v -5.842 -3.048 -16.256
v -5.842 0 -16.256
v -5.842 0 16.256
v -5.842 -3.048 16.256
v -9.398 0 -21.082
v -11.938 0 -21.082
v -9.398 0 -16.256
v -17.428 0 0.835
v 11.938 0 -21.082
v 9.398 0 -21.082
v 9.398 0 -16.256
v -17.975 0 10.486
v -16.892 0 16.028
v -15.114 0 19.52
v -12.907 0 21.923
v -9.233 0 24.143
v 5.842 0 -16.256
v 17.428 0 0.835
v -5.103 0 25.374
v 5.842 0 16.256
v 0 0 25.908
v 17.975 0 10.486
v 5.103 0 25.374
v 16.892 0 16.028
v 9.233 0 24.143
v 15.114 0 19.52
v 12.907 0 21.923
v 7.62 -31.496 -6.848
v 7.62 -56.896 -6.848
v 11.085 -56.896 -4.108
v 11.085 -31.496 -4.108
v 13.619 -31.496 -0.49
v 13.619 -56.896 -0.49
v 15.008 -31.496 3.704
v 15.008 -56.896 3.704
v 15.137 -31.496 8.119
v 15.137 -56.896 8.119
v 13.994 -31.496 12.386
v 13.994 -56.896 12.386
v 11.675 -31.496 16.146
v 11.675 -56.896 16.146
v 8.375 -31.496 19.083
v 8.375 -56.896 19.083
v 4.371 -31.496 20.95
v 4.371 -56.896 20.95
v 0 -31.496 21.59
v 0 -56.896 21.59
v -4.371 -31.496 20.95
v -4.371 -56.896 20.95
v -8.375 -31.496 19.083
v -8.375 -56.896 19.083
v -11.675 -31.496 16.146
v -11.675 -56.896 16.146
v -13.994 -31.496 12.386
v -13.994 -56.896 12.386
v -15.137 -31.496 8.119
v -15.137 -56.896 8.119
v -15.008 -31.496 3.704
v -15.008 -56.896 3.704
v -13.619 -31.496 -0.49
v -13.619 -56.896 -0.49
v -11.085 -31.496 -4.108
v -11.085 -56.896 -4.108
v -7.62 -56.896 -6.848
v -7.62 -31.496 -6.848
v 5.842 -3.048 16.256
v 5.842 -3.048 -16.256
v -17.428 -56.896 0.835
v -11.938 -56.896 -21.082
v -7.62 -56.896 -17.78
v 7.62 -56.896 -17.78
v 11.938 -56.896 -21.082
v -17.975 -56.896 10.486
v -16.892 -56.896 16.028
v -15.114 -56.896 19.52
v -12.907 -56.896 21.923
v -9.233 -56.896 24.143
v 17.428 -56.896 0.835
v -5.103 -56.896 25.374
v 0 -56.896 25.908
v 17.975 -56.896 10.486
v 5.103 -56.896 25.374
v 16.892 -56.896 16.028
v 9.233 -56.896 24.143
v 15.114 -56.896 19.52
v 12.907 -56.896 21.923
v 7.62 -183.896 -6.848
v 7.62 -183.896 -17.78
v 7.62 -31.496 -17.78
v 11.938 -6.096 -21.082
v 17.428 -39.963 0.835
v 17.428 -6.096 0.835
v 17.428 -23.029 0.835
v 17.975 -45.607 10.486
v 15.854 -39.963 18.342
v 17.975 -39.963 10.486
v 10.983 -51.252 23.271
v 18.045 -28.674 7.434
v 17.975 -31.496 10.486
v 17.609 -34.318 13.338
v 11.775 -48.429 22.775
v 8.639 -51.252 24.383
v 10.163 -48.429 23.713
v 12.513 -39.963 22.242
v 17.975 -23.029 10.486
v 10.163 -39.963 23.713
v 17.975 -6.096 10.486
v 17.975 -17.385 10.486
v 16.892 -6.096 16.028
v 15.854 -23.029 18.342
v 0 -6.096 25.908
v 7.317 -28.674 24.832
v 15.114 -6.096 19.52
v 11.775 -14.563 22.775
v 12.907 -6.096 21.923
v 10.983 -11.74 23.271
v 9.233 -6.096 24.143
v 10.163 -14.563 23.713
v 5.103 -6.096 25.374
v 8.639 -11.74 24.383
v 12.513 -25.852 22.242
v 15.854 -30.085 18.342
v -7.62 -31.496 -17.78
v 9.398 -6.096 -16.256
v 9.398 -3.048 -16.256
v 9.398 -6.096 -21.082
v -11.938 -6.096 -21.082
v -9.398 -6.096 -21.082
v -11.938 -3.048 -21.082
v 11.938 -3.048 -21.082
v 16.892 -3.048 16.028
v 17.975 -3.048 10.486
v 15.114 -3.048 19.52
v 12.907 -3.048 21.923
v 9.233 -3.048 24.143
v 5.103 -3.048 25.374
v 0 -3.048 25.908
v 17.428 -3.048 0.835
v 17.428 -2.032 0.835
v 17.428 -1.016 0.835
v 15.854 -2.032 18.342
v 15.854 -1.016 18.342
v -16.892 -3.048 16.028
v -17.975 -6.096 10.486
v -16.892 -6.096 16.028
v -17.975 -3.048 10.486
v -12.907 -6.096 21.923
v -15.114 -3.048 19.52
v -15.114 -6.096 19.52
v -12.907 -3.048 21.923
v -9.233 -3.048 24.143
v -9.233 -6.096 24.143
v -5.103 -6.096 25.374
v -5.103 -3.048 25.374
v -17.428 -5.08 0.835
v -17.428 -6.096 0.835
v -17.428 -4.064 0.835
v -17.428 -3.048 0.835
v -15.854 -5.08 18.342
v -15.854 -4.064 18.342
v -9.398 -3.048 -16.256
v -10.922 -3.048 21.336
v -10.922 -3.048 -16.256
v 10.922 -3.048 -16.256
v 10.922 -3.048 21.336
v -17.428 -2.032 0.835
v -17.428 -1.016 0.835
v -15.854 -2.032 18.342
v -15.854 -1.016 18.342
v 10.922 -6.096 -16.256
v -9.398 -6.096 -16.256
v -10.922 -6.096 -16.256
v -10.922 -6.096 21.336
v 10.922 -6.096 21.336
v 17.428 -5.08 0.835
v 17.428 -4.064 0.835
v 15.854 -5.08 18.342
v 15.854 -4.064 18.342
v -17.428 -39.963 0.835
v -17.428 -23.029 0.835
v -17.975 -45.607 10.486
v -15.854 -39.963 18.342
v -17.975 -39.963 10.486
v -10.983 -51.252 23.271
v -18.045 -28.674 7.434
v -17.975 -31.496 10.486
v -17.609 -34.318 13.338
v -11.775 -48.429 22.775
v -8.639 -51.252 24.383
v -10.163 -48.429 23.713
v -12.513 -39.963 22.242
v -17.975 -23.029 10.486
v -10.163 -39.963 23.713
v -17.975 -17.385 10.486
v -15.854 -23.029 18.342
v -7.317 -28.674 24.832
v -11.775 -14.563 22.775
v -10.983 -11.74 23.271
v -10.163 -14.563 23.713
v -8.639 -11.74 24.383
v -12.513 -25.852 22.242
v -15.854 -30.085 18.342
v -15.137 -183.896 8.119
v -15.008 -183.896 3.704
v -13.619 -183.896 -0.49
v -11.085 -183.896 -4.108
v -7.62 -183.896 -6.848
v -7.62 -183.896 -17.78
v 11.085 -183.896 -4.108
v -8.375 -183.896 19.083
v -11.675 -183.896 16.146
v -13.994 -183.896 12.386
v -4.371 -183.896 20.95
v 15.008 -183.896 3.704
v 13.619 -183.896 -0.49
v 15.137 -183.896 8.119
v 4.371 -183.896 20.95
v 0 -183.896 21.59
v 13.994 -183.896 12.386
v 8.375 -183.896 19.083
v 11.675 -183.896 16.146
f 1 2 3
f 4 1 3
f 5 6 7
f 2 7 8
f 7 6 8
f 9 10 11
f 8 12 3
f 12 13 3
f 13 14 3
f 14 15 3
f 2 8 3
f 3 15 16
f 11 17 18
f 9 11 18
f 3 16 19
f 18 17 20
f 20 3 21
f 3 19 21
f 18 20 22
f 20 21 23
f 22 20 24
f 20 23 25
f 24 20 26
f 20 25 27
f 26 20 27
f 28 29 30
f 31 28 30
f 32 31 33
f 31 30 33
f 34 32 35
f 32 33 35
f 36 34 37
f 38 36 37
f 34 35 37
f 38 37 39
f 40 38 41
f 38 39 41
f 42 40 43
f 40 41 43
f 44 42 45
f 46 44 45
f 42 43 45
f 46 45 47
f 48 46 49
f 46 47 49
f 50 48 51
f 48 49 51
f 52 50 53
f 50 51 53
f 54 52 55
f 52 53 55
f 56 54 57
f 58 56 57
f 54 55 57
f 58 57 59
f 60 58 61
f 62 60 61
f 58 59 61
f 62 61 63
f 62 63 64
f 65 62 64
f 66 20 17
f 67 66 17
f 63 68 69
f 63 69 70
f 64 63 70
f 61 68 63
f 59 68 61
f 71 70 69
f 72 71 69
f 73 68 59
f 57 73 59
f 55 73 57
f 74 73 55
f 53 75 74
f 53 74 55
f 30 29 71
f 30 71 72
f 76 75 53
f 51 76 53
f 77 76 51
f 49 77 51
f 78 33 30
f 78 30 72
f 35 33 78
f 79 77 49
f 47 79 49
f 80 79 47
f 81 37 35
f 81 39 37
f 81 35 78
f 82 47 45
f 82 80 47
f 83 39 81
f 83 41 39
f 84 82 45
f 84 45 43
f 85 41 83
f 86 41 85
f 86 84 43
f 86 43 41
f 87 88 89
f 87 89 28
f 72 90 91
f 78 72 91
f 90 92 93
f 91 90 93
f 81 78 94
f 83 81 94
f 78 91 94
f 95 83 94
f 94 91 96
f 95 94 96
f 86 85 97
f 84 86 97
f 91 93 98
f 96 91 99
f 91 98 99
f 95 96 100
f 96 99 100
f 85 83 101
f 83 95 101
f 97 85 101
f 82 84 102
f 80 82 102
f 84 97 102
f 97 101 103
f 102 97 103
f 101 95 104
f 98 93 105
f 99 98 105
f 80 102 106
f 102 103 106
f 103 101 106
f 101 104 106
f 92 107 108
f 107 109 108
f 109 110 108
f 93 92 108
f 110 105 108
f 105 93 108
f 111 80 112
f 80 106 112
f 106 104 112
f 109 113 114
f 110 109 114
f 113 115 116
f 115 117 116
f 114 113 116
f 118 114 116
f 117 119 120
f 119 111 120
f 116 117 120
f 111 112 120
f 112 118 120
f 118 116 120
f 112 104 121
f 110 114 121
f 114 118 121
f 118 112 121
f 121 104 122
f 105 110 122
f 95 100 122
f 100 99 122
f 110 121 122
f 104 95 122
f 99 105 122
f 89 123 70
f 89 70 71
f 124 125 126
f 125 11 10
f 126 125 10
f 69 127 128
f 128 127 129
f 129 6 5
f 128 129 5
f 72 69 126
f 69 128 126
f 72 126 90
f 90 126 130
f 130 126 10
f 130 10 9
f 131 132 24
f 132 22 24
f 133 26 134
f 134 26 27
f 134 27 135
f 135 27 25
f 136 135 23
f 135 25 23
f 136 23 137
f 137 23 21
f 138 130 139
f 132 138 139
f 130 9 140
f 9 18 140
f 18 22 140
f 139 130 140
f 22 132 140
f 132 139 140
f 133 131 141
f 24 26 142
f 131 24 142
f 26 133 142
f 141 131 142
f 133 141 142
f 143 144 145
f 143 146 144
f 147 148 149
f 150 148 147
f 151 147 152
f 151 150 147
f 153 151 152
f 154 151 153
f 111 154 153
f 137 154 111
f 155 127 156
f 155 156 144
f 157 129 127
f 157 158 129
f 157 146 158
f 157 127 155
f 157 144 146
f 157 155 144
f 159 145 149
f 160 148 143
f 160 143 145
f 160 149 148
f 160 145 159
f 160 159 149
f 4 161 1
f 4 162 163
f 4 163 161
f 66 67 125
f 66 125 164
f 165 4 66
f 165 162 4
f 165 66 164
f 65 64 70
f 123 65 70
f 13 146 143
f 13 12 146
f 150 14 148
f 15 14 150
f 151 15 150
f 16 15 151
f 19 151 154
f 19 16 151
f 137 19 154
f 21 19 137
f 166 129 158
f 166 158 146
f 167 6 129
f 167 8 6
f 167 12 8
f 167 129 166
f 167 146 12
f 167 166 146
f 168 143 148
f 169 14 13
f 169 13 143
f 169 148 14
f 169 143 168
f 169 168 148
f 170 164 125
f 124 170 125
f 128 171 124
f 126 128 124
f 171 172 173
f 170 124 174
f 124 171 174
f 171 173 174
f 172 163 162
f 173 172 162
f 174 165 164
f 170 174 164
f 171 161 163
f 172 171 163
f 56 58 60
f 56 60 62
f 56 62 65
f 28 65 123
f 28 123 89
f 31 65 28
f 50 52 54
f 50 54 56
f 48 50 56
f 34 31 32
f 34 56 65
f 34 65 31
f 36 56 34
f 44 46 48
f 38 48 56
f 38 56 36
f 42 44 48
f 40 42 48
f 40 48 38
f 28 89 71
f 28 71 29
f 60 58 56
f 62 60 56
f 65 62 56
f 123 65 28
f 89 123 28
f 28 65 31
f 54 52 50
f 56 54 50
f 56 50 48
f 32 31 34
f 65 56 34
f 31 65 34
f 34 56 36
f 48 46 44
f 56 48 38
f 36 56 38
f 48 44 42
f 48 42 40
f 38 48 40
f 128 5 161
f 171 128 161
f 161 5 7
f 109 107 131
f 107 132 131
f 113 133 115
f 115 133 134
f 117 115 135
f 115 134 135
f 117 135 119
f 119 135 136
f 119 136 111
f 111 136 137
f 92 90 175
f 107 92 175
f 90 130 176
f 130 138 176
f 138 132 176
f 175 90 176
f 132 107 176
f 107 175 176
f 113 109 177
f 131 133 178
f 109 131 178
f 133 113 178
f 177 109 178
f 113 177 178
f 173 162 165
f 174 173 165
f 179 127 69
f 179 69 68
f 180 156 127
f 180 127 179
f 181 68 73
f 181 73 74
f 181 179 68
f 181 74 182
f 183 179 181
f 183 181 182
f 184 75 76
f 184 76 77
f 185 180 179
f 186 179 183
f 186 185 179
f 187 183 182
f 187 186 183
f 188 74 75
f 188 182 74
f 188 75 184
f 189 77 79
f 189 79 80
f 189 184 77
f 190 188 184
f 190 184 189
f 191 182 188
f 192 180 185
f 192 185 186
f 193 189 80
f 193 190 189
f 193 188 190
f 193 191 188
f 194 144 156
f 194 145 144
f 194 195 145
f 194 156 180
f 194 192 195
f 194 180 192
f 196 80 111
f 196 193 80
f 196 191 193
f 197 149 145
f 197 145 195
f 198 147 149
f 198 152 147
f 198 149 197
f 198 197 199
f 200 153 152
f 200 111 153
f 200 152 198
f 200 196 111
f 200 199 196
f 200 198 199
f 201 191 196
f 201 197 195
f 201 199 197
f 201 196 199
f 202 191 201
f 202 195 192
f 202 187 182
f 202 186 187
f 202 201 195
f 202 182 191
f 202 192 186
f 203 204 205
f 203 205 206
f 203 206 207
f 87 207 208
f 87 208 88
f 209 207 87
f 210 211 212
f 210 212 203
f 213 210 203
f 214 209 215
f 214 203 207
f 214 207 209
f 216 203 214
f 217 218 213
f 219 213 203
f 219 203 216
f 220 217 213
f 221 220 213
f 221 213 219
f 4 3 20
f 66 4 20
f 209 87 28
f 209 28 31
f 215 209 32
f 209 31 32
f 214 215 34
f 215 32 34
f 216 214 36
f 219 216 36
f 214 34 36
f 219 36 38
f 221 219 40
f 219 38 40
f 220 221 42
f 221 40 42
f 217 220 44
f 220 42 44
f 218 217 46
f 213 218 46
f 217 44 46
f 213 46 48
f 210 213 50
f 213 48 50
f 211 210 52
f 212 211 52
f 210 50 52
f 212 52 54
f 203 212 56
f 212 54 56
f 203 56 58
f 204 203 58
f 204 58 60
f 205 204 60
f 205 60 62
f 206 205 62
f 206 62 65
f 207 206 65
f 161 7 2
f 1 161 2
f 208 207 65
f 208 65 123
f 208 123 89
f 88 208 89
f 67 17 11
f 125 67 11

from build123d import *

# Parameters (mm, degrees)
F1_DEPTH = 3.048
F3_DEPTH = 3.048
F5_DEPTH = 50.8
F7_DEPTH = 25.4
F8_DEPTH = 152.4


with BuildPart() as f1:
    # F0 (on Front) → F1 (new body)
    with BuildSketch(Plane.XZ):
        with BuildLine():
            Line((-5.842, -16.256), (-5.842, 16.256))
            Line((-5.842, 16.256), (5.842, 16.256))
            Line((5.842, 16.256), (5.842, -16.256))
            Line((5.842, -16.256), (9.398, -16.256))
            Line((9.398, -16.256), (9.398, -21.082))
            Line((9.398, -21.082), (11.938, -21.082))
            add(Edge.make_bspline(
                [(11.938, -21.082), (18.554886803, 1.1973426444), (25.400293991, 25.156263262), (0, 25.908)],
                knots=[0, 0, 0, 0, 48.482738619, 48.482738619, 48.482738619, 48.482738619], degree=3))
            add(Edge.make_bspline(
                [(-11.938, -21.082), (-18.554886803, 1.1973426444), (-25.400293991, 25.156263262), (0, 25.908)],
                knots=[0, 0, 0, 0, 48.482738619, 48.482738619, 48.482738619, 48.482738619], degree=3))
            Line((-11.938, -21.082), (-9.398, -21.082))
            Line((-9.398, -21.082), (-9.398, -16.256))
            Line((-9.398, -16.256), (-5.842, -16.256))
        make_face()
    extrude(amount=F1_DEPTH)

    # F2 (on face) → F3 (join)
    with BuildSketch(Plane.XZ.offset(3.048)):
        with BuildLine():
            Line((-10.922, -16.256), (-10.922, 21.336))
            Line((-10.922, 21.336), (10.922, 21.336))
            Line((10.922, 21.336), (10.922, -16.256))
            Line((10.922, -16.256), (9.398, -16.256))
            Line((9.398, -16.256), (9.398, -21.082))
            Line((9.398, -21.082), (11.938, -21.082))
            add(Edge.make_bspline(
                [(11.938, -21.082), (18.554886803, 1.1973426444), (25.400293991, 25.156263262), (0, 25.908)],
                knots=[0, 0, 0, 0, 48.482738619, 48.482738619, 48.482738619, 48.482738619], degree=3))
            add(Edge.make_bspline(
                [(-11.938, -21.082), (-18.554886803, 1.1973426444), (-25.400293991, 25.156263262), (0, 25.908)],
                knots=[0, 0, 0, 0, 48.482738619, 48.482738619, 48.482738619, 48.482738619], degree=3))
            Line((-11.938, -21.082), (-9.398, -21.082))
            Line((-9.398, -21.082), (-9.398, -16.256))
            Line((-9.398, -16.256), (-10.922, -16.256))
        make_face()
    extrude(amount=F3_DEPTH)

    # F4 (on face) → F5 (join)
    with BuildSketch(Plane.XZ.offset(6.096)):
        with BuildLine():
            Line((-11.938, -21.082), (-9.398, -21.082))
            Line((-9.398, -21.082), (-9.398, -16.256))
            Line((-9.398, -16.256), (-10.922, -16.256))
            Line((-10.922, -16.256), (-10.922, 21.336))
            Line((-10.922, 21.336), (10.922, 21.336))
            Line((10.922, 21.336), (10.922, -16.256))
            Line((10.922, -16.256), (9.398, -16.256))
            Line((9.398, -16.256), (9.398, -21.082))
            Line((9.398, -21.082), (11.938, -21.082))
            add(Edge.make_bspline(
                [(11.938, -21.082), (18.554886803, 1.1973426444), (25.400293991, 25.156263262), (0, 25.908)],
                knots=[0, 0, 0, 0, 48.482738619, 48.482738619, 48.482738619, 48.482738619], degree=3))
            add(Edge.make_bspline(
                [(-11.938, -21.082), (-18.554886803, 1.1973426444), (-25.400293991, 25.156263262), (0, 25.908)],
                knots=[0, 0, 0, 0, 48.482738619, 48.482738619, 48.482738619, 48.482738619], degree=3))
        make_face()
        Polygon((-9.398, -16.256), (-9.398, -21.082), (9.398, -21.082), (9.398, -16.256), (10.922, -16.256), (10.922, 21.336), (-10.922, 21.336), (-10.922, -16.256), align=None)
    extrude(amount=F5_DEPTH)

    # F6 (on face) → F7 (cut)
    with BuildSketch(Plane.XZ.offset(56.896)):
        with BuildLine():
            Line((7.62, -17.78), (7.62, -6.8482271537))
            ThreePointArc((7.62, -6.8482271537), (0, 21.59), (-7.62, -6.8482271537))
            Line((-7.62, -6.8482271537), (-7.62, -17.78))
            Line((-7.62, -17.78), (7.62, -17.78))
        make_face()
    extrude(amount=-F7_DEPTH, mode=Mode.SUBTRACT)


with BuildPart() as f8:
    # F8 (new): a face of the model
    f8_faces = [f1.part.faces().sort_by_distance(p)[0] for p in [
        (0, -31.496, 3.1342608051),
    ]]
    extrude(f8_faces, amount=F8_DEPTH)


solid = Compound([f1.part, f8.part])
